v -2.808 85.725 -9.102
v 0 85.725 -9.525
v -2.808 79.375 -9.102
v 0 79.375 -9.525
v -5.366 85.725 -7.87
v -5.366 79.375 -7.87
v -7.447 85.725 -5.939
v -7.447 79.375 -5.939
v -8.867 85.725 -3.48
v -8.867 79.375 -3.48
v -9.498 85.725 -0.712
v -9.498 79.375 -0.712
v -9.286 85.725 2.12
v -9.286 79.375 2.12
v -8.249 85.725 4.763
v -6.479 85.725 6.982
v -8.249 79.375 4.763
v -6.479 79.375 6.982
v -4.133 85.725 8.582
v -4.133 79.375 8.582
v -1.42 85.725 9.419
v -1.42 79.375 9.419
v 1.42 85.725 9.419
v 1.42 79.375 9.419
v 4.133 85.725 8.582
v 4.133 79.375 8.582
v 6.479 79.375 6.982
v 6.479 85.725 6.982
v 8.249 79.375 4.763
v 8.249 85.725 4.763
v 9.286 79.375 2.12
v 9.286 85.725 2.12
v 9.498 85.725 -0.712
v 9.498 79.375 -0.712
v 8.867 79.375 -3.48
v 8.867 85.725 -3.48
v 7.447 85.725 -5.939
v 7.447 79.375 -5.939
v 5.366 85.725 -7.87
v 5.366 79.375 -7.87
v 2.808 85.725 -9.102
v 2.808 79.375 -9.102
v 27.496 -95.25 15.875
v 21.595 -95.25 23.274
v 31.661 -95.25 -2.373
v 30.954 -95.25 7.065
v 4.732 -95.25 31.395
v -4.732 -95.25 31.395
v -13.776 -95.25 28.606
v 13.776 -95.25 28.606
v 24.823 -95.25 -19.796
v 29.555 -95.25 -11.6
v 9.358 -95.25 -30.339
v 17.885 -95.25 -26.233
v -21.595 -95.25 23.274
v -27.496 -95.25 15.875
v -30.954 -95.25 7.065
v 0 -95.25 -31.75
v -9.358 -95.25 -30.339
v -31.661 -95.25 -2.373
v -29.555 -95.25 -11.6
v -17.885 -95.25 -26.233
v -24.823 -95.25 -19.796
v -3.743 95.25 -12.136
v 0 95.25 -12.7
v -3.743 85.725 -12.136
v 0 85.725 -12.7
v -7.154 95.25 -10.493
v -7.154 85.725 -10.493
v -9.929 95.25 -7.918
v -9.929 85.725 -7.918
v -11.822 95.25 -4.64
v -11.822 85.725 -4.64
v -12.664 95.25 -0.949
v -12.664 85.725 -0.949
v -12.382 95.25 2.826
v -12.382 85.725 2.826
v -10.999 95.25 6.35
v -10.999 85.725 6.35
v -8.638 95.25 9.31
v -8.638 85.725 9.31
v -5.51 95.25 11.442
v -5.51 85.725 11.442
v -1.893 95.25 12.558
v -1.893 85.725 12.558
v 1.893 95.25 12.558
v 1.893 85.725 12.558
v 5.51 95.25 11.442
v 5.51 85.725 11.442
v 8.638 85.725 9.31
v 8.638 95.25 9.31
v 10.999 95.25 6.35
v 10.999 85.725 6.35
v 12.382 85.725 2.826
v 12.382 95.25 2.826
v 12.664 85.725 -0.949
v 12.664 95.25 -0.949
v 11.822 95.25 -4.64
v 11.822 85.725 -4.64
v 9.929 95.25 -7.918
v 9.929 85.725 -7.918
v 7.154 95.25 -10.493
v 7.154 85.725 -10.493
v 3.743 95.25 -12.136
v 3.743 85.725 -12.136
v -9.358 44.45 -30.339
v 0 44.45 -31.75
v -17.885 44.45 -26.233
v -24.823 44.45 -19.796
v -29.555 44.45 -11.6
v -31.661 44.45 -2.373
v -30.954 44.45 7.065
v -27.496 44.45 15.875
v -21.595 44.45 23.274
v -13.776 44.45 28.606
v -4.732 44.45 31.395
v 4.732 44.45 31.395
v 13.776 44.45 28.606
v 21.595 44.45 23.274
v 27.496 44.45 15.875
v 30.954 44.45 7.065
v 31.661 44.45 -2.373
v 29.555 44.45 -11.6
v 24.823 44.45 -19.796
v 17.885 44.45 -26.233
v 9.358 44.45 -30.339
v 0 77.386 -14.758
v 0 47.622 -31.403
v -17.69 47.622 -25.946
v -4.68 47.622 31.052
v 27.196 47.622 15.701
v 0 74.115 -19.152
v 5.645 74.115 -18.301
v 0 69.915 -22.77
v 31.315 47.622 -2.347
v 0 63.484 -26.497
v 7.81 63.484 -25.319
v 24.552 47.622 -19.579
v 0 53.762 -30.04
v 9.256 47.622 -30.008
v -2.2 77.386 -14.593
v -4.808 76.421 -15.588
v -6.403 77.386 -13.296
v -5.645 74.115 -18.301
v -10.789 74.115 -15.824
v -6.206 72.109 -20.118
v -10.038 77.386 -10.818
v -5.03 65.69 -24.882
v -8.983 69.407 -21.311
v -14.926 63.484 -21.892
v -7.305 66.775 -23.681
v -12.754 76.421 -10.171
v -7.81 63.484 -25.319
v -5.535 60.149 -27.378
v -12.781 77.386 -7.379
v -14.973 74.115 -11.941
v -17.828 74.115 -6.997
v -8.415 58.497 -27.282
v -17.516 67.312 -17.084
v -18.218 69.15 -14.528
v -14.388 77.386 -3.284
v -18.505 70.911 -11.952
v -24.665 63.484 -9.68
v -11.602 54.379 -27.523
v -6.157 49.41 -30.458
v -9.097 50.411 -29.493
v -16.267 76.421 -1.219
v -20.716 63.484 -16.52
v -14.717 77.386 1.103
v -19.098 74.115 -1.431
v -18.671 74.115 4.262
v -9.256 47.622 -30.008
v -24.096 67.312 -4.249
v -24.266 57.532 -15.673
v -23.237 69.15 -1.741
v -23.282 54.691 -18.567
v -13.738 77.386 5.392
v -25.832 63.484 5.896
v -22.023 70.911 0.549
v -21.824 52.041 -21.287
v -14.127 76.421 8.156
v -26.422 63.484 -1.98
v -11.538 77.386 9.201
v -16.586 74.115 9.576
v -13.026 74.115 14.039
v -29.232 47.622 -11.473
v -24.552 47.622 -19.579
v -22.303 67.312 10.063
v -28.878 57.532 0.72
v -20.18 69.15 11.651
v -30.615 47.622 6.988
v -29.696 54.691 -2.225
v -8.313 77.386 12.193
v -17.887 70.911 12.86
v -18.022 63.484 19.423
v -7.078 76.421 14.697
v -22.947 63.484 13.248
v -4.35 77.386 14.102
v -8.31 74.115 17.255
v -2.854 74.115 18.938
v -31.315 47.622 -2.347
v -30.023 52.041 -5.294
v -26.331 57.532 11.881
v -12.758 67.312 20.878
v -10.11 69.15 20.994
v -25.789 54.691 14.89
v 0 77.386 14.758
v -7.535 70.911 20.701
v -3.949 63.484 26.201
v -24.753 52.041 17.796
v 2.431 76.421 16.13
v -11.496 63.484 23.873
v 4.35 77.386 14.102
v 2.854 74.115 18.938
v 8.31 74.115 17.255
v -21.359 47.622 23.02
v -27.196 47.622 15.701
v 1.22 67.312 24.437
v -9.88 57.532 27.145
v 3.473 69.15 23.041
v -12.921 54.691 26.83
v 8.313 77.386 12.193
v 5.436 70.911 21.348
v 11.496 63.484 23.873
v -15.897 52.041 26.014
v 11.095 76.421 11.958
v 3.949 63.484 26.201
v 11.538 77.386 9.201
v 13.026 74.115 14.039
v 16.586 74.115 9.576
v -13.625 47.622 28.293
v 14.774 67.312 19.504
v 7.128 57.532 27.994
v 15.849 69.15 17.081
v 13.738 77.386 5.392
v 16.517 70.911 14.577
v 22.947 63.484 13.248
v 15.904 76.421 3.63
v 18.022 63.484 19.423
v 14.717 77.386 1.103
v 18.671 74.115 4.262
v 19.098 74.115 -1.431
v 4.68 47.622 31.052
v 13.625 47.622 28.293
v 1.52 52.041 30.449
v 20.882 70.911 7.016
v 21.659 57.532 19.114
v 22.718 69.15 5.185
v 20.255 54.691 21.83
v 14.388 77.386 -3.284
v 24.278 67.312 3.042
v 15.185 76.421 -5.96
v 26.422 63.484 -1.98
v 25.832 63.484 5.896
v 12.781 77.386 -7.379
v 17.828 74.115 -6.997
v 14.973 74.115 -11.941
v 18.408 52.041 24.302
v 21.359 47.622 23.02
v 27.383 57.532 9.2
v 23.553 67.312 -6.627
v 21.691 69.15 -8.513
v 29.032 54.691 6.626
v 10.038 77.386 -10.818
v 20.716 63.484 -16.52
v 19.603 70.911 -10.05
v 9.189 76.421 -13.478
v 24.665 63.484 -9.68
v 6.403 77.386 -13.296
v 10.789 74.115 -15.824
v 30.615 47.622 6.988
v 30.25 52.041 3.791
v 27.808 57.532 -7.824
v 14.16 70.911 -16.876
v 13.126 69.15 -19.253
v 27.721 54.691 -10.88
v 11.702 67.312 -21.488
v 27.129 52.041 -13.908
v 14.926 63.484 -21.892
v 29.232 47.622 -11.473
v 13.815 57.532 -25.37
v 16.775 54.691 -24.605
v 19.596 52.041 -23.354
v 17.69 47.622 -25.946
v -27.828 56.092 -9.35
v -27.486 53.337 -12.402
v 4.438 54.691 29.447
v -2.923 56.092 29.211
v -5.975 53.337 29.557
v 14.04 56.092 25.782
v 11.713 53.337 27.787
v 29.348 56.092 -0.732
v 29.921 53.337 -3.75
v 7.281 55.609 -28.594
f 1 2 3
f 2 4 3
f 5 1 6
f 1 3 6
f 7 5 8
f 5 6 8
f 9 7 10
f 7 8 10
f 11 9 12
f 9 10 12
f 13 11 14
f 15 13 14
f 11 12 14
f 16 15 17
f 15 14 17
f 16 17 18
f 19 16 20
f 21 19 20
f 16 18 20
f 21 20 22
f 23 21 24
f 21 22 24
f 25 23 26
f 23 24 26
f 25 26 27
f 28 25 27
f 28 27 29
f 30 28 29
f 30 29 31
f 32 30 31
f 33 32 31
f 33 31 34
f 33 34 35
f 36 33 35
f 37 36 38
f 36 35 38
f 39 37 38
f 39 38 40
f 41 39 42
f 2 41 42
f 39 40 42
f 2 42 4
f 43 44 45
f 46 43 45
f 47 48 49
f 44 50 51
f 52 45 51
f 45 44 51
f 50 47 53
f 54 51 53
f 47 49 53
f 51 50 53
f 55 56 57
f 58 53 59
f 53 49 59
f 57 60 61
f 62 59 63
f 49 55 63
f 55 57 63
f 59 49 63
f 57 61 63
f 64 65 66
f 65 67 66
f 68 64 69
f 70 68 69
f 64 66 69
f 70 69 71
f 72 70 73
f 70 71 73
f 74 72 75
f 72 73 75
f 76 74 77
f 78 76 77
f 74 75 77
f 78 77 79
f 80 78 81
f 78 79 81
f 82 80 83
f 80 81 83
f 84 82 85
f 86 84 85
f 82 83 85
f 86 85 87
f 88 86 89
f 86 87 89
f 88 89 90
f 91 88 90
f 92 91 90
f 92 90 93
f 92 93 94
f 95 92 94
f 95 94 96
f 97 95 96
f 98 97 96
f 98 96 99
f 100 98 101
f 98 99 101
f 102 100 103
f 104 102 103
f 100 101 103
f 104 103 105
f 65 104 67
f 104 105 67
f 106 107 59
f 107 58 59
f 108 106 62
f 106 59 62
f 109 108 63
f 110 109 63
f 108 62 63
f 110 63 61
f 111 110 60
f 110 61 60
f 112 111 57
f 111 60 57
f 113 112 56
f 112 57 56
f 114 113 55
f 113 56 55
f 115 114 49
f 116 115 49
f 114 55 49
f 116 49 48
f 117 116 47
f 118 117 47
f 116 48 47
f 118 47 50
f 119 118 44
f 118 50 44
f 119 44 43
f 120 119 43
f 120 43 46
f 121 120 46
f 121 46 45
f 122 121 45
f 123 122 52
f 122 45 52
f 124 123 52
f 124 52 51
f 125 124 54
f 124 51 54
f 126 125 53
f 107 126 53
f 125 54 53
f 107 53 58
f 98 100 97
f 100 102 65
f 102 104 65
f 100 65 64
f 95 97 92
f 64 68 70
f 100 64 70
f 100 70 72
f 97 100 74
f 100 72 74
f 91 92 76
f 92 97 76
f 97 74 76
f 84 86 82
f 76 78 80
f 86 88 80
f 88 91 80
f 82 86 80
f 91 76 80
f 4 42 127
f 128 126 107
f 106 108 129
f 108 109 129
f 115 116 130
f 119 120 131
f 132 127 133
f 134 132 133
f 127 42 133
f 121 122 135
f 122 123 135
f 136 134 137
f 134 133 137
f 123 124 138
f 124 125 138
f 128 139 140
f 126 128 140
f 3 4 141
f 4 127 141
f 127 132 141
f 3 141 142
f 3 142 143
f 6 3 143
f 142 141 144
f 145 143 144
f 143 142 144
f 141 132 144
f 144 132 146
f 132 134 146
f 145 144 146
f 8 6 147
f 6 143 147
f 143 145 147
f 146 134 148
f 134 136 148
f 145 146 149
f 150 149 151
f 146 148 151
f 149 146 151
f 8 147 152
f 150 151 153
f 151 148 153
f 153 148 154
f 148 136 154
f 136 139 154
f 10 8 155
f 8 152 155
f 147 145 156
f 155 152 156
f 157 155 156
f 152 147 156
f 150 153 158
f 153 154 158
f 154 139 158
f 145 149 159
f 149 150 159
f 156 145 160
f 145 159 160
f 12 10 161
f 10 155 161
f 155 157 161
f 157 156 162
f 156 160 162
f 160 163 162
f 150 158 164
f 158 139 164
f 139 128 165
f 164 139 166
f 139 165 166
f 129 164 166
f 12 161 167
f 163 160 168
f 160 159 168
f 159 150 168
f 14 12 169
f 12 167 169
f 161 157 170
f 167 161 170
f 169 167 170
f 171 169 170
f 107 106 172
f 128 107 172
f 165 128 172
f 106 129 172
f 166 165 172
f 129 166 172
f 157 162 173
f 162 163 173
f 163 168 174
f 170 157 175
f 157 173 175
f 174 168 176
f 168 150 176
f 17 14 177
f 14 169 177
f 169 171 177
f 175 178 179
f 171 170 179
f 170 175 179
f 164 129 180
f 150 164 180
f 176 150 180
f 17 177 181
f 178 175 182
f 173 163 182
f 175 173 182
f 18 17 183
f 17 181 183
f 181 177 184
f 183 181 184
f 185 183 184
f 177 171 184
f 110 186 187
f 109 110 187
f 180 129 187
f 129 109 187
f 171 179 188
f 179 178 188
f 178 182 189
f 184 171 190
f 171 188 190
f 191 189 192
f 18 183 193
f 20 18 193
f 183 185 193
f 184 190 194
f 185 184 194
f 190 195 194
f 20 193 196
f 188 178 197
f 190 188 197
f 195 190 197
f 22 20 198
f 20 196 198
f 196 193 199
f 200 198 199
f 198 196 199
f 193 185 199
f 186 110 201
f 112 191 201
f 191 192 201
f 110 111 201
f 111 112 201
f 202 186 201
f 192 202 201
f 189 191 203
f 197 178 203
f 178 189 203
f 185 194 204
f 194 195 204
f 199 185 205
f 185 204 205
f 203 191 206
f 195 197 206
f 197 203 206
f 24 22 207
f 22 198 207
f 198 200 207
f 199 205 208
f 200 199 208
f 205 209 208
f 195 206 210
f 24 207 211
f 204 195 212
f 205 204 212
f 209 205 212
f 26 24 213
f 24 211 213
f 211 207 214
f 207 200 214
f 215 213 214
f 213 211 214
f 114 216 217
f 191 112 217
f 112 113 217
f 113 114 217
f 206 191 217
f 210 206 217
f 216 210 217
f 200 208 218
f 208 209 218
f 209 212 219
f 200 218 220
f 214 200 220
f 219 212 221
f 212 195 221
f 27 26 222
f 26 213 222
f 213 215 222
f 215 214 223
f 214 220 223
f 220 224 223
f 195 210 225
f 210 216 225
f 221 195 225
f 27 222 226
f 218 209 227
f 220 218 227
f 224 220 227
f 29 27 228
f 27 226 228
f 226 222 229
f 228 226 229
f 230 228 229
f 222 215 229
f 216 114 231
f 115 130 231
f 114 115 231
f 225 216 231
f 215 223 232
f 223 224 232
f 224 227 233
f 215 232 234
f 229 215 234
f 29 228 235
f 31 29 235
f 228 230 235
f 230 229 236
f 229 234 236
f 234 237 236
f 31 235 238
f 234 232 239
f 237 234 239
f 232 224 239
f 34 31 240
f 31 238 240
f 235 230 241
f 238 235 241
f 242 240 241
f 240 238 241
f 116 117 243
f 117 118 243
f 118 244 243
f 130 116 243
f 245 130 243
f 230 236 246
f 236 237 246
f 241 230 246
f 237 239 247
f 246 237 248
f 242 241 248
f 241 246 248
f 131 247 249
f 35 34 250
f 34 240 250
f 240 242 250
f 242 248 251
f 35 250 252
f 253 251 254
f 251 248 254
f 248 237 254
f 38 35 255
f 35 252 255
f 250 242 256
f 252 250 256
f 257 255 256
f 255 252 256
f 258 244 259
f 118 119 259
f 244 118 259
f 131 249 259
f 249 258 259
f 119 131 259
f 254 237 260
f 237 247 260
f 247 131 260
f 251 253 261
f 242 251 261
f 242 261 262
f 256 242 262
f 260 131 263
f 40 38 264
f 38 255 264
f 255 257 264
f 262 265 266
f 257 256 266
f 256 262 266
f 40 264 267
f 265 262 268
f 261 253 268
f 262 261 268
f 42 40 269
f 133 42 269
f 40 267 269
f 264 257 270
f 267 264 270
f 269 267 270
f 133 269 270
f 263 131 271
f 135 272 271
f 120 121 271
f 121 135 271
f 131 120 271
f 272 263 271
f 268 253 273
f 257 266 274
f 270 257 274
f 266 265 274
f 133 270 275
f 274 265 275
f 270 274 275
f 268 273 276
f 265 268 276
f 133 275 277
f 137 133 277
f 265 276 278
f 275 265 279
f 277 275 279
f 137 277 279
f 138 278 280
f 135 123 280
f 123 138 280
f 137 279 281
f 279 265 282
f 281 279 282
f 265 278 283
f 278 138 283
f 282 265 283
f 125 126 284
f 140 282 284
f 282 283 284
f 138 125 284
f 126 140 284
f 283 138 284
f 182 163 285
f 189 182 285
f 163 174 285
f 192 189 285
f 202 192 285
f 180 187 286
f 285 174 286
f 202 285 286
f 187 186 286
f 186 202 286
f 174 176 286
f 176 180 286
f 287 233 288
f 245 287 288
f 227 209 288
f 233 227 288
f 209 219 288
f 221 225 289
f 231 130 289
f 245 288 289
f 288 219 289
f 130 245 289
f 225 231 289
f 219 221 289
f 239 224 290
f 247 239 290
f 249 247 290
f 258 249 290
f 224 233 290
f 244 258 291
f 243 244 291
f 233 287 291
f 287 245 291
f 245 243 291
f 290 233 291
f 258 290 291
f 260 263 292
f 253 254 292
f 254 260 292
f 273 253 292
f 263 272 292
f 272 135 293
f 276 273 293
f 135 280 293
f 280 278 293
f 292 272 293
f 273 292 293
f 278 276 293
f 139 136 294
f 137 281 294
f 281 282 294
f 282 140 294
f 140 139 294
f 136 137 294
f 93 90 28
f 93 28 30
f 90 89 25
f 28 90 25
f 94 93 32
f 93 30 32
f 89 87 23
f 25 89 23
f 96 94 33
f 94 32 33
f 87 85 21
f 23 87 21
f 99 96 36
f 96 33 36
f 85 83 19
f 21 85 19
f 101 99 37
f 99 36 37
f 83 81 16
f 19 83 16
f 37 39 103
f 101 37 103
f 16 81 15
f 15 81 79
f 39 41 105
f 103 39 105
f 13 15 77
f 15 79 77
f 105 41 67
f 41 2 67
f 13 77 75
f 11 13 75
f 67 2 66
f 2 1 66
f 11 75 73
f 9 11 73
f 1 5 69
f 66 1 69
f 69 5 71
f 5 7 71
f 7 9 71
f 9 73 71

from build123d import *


with BuildPart() as part:
    # Sketch1 → Revolve1 (revolve)
    with BuildSketch(Plane(origin=(0, 0, 0), x_dir=(0, 0, -1), z_dir=(1, 0, 0))):
        with BuildLine():
            Line((0, 95.25), (12.7, 95.25))
            Line((12.7, 95.25), (12.7, 85.725))
            Line((12.7, 85.725), (9.525, 85.725))
            Line((9.525, 85.725), (9.525, 79.375))
            add(Edge.make_bspline(
                [(9.525, 79.375), (27.523263922, 75.474774462), (31.900002123, 46.864796856), (31.75, 44.45)],
                knots=[0, 0, 0, 0, 1, 1, 1, 1], degree=3))
            Line((31.75, 44.45), (31.75, -95.25))
            Line((31.75, -95.25), (0, -95.25))
            Line((0, -95.25), (0, 95.25))
        make_face()
    revolve(axis=Axis((0, -95.25, 0), (0, 1, 0)))


solid = part.part
